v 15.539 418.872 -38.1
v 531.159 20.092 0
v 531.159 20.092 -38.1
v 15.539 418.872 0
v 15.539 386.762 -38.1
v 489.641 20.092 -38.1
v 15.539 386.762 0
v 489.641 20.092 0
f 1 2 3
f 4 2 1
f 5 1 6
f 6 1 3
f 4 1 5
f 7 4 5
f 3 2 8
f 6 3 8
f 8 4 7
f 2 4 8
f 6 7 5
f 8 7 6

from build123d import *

# Parameters (mm, degrees)
BOSS_EXTRUDE1_DEPTH = 38.1
CUT_EXTRUDE1_DEPTH  = 127
CUT_EXTRUDE3_DEPTH  = 127


with BuildPart() as part:
    # Sketch1 → Boss-Extrude1 (new body)
    with BuildSketch(Plane.XY):
        Polygon((0, 398.78), (515.62, 0), (531.159215878, 20.092107154), (15.539215878, 418.872107154), align=None)
    extrude(amount=-BOSS_EXTRUDE1_DEPTH)

    # Sketch3 → Cut-Extrude1 (cut)
    with BuildSketch(Plane.XY):
        Polygon((15.539215878, 418.872107154), (15.539215878, 386.76198575), (0, 398.78), align=None)
    extrude(amount=-CUT_EXTRUDE1_DEPTH, mode=Mode.SUBTRACT)

    # Sketch4 → Cut-Extrude3 (cut)
    with BuildSketch(Plane.XY):
        Polygon((531.159215878, 20.092107154), (489.641033425, 20.092107154), (515.62, 0), align=None)
    extrude(amount=-CUT_EXTRUDE3_DEPTH, mode=Mode.SUBTRACT)


solid = part.part
